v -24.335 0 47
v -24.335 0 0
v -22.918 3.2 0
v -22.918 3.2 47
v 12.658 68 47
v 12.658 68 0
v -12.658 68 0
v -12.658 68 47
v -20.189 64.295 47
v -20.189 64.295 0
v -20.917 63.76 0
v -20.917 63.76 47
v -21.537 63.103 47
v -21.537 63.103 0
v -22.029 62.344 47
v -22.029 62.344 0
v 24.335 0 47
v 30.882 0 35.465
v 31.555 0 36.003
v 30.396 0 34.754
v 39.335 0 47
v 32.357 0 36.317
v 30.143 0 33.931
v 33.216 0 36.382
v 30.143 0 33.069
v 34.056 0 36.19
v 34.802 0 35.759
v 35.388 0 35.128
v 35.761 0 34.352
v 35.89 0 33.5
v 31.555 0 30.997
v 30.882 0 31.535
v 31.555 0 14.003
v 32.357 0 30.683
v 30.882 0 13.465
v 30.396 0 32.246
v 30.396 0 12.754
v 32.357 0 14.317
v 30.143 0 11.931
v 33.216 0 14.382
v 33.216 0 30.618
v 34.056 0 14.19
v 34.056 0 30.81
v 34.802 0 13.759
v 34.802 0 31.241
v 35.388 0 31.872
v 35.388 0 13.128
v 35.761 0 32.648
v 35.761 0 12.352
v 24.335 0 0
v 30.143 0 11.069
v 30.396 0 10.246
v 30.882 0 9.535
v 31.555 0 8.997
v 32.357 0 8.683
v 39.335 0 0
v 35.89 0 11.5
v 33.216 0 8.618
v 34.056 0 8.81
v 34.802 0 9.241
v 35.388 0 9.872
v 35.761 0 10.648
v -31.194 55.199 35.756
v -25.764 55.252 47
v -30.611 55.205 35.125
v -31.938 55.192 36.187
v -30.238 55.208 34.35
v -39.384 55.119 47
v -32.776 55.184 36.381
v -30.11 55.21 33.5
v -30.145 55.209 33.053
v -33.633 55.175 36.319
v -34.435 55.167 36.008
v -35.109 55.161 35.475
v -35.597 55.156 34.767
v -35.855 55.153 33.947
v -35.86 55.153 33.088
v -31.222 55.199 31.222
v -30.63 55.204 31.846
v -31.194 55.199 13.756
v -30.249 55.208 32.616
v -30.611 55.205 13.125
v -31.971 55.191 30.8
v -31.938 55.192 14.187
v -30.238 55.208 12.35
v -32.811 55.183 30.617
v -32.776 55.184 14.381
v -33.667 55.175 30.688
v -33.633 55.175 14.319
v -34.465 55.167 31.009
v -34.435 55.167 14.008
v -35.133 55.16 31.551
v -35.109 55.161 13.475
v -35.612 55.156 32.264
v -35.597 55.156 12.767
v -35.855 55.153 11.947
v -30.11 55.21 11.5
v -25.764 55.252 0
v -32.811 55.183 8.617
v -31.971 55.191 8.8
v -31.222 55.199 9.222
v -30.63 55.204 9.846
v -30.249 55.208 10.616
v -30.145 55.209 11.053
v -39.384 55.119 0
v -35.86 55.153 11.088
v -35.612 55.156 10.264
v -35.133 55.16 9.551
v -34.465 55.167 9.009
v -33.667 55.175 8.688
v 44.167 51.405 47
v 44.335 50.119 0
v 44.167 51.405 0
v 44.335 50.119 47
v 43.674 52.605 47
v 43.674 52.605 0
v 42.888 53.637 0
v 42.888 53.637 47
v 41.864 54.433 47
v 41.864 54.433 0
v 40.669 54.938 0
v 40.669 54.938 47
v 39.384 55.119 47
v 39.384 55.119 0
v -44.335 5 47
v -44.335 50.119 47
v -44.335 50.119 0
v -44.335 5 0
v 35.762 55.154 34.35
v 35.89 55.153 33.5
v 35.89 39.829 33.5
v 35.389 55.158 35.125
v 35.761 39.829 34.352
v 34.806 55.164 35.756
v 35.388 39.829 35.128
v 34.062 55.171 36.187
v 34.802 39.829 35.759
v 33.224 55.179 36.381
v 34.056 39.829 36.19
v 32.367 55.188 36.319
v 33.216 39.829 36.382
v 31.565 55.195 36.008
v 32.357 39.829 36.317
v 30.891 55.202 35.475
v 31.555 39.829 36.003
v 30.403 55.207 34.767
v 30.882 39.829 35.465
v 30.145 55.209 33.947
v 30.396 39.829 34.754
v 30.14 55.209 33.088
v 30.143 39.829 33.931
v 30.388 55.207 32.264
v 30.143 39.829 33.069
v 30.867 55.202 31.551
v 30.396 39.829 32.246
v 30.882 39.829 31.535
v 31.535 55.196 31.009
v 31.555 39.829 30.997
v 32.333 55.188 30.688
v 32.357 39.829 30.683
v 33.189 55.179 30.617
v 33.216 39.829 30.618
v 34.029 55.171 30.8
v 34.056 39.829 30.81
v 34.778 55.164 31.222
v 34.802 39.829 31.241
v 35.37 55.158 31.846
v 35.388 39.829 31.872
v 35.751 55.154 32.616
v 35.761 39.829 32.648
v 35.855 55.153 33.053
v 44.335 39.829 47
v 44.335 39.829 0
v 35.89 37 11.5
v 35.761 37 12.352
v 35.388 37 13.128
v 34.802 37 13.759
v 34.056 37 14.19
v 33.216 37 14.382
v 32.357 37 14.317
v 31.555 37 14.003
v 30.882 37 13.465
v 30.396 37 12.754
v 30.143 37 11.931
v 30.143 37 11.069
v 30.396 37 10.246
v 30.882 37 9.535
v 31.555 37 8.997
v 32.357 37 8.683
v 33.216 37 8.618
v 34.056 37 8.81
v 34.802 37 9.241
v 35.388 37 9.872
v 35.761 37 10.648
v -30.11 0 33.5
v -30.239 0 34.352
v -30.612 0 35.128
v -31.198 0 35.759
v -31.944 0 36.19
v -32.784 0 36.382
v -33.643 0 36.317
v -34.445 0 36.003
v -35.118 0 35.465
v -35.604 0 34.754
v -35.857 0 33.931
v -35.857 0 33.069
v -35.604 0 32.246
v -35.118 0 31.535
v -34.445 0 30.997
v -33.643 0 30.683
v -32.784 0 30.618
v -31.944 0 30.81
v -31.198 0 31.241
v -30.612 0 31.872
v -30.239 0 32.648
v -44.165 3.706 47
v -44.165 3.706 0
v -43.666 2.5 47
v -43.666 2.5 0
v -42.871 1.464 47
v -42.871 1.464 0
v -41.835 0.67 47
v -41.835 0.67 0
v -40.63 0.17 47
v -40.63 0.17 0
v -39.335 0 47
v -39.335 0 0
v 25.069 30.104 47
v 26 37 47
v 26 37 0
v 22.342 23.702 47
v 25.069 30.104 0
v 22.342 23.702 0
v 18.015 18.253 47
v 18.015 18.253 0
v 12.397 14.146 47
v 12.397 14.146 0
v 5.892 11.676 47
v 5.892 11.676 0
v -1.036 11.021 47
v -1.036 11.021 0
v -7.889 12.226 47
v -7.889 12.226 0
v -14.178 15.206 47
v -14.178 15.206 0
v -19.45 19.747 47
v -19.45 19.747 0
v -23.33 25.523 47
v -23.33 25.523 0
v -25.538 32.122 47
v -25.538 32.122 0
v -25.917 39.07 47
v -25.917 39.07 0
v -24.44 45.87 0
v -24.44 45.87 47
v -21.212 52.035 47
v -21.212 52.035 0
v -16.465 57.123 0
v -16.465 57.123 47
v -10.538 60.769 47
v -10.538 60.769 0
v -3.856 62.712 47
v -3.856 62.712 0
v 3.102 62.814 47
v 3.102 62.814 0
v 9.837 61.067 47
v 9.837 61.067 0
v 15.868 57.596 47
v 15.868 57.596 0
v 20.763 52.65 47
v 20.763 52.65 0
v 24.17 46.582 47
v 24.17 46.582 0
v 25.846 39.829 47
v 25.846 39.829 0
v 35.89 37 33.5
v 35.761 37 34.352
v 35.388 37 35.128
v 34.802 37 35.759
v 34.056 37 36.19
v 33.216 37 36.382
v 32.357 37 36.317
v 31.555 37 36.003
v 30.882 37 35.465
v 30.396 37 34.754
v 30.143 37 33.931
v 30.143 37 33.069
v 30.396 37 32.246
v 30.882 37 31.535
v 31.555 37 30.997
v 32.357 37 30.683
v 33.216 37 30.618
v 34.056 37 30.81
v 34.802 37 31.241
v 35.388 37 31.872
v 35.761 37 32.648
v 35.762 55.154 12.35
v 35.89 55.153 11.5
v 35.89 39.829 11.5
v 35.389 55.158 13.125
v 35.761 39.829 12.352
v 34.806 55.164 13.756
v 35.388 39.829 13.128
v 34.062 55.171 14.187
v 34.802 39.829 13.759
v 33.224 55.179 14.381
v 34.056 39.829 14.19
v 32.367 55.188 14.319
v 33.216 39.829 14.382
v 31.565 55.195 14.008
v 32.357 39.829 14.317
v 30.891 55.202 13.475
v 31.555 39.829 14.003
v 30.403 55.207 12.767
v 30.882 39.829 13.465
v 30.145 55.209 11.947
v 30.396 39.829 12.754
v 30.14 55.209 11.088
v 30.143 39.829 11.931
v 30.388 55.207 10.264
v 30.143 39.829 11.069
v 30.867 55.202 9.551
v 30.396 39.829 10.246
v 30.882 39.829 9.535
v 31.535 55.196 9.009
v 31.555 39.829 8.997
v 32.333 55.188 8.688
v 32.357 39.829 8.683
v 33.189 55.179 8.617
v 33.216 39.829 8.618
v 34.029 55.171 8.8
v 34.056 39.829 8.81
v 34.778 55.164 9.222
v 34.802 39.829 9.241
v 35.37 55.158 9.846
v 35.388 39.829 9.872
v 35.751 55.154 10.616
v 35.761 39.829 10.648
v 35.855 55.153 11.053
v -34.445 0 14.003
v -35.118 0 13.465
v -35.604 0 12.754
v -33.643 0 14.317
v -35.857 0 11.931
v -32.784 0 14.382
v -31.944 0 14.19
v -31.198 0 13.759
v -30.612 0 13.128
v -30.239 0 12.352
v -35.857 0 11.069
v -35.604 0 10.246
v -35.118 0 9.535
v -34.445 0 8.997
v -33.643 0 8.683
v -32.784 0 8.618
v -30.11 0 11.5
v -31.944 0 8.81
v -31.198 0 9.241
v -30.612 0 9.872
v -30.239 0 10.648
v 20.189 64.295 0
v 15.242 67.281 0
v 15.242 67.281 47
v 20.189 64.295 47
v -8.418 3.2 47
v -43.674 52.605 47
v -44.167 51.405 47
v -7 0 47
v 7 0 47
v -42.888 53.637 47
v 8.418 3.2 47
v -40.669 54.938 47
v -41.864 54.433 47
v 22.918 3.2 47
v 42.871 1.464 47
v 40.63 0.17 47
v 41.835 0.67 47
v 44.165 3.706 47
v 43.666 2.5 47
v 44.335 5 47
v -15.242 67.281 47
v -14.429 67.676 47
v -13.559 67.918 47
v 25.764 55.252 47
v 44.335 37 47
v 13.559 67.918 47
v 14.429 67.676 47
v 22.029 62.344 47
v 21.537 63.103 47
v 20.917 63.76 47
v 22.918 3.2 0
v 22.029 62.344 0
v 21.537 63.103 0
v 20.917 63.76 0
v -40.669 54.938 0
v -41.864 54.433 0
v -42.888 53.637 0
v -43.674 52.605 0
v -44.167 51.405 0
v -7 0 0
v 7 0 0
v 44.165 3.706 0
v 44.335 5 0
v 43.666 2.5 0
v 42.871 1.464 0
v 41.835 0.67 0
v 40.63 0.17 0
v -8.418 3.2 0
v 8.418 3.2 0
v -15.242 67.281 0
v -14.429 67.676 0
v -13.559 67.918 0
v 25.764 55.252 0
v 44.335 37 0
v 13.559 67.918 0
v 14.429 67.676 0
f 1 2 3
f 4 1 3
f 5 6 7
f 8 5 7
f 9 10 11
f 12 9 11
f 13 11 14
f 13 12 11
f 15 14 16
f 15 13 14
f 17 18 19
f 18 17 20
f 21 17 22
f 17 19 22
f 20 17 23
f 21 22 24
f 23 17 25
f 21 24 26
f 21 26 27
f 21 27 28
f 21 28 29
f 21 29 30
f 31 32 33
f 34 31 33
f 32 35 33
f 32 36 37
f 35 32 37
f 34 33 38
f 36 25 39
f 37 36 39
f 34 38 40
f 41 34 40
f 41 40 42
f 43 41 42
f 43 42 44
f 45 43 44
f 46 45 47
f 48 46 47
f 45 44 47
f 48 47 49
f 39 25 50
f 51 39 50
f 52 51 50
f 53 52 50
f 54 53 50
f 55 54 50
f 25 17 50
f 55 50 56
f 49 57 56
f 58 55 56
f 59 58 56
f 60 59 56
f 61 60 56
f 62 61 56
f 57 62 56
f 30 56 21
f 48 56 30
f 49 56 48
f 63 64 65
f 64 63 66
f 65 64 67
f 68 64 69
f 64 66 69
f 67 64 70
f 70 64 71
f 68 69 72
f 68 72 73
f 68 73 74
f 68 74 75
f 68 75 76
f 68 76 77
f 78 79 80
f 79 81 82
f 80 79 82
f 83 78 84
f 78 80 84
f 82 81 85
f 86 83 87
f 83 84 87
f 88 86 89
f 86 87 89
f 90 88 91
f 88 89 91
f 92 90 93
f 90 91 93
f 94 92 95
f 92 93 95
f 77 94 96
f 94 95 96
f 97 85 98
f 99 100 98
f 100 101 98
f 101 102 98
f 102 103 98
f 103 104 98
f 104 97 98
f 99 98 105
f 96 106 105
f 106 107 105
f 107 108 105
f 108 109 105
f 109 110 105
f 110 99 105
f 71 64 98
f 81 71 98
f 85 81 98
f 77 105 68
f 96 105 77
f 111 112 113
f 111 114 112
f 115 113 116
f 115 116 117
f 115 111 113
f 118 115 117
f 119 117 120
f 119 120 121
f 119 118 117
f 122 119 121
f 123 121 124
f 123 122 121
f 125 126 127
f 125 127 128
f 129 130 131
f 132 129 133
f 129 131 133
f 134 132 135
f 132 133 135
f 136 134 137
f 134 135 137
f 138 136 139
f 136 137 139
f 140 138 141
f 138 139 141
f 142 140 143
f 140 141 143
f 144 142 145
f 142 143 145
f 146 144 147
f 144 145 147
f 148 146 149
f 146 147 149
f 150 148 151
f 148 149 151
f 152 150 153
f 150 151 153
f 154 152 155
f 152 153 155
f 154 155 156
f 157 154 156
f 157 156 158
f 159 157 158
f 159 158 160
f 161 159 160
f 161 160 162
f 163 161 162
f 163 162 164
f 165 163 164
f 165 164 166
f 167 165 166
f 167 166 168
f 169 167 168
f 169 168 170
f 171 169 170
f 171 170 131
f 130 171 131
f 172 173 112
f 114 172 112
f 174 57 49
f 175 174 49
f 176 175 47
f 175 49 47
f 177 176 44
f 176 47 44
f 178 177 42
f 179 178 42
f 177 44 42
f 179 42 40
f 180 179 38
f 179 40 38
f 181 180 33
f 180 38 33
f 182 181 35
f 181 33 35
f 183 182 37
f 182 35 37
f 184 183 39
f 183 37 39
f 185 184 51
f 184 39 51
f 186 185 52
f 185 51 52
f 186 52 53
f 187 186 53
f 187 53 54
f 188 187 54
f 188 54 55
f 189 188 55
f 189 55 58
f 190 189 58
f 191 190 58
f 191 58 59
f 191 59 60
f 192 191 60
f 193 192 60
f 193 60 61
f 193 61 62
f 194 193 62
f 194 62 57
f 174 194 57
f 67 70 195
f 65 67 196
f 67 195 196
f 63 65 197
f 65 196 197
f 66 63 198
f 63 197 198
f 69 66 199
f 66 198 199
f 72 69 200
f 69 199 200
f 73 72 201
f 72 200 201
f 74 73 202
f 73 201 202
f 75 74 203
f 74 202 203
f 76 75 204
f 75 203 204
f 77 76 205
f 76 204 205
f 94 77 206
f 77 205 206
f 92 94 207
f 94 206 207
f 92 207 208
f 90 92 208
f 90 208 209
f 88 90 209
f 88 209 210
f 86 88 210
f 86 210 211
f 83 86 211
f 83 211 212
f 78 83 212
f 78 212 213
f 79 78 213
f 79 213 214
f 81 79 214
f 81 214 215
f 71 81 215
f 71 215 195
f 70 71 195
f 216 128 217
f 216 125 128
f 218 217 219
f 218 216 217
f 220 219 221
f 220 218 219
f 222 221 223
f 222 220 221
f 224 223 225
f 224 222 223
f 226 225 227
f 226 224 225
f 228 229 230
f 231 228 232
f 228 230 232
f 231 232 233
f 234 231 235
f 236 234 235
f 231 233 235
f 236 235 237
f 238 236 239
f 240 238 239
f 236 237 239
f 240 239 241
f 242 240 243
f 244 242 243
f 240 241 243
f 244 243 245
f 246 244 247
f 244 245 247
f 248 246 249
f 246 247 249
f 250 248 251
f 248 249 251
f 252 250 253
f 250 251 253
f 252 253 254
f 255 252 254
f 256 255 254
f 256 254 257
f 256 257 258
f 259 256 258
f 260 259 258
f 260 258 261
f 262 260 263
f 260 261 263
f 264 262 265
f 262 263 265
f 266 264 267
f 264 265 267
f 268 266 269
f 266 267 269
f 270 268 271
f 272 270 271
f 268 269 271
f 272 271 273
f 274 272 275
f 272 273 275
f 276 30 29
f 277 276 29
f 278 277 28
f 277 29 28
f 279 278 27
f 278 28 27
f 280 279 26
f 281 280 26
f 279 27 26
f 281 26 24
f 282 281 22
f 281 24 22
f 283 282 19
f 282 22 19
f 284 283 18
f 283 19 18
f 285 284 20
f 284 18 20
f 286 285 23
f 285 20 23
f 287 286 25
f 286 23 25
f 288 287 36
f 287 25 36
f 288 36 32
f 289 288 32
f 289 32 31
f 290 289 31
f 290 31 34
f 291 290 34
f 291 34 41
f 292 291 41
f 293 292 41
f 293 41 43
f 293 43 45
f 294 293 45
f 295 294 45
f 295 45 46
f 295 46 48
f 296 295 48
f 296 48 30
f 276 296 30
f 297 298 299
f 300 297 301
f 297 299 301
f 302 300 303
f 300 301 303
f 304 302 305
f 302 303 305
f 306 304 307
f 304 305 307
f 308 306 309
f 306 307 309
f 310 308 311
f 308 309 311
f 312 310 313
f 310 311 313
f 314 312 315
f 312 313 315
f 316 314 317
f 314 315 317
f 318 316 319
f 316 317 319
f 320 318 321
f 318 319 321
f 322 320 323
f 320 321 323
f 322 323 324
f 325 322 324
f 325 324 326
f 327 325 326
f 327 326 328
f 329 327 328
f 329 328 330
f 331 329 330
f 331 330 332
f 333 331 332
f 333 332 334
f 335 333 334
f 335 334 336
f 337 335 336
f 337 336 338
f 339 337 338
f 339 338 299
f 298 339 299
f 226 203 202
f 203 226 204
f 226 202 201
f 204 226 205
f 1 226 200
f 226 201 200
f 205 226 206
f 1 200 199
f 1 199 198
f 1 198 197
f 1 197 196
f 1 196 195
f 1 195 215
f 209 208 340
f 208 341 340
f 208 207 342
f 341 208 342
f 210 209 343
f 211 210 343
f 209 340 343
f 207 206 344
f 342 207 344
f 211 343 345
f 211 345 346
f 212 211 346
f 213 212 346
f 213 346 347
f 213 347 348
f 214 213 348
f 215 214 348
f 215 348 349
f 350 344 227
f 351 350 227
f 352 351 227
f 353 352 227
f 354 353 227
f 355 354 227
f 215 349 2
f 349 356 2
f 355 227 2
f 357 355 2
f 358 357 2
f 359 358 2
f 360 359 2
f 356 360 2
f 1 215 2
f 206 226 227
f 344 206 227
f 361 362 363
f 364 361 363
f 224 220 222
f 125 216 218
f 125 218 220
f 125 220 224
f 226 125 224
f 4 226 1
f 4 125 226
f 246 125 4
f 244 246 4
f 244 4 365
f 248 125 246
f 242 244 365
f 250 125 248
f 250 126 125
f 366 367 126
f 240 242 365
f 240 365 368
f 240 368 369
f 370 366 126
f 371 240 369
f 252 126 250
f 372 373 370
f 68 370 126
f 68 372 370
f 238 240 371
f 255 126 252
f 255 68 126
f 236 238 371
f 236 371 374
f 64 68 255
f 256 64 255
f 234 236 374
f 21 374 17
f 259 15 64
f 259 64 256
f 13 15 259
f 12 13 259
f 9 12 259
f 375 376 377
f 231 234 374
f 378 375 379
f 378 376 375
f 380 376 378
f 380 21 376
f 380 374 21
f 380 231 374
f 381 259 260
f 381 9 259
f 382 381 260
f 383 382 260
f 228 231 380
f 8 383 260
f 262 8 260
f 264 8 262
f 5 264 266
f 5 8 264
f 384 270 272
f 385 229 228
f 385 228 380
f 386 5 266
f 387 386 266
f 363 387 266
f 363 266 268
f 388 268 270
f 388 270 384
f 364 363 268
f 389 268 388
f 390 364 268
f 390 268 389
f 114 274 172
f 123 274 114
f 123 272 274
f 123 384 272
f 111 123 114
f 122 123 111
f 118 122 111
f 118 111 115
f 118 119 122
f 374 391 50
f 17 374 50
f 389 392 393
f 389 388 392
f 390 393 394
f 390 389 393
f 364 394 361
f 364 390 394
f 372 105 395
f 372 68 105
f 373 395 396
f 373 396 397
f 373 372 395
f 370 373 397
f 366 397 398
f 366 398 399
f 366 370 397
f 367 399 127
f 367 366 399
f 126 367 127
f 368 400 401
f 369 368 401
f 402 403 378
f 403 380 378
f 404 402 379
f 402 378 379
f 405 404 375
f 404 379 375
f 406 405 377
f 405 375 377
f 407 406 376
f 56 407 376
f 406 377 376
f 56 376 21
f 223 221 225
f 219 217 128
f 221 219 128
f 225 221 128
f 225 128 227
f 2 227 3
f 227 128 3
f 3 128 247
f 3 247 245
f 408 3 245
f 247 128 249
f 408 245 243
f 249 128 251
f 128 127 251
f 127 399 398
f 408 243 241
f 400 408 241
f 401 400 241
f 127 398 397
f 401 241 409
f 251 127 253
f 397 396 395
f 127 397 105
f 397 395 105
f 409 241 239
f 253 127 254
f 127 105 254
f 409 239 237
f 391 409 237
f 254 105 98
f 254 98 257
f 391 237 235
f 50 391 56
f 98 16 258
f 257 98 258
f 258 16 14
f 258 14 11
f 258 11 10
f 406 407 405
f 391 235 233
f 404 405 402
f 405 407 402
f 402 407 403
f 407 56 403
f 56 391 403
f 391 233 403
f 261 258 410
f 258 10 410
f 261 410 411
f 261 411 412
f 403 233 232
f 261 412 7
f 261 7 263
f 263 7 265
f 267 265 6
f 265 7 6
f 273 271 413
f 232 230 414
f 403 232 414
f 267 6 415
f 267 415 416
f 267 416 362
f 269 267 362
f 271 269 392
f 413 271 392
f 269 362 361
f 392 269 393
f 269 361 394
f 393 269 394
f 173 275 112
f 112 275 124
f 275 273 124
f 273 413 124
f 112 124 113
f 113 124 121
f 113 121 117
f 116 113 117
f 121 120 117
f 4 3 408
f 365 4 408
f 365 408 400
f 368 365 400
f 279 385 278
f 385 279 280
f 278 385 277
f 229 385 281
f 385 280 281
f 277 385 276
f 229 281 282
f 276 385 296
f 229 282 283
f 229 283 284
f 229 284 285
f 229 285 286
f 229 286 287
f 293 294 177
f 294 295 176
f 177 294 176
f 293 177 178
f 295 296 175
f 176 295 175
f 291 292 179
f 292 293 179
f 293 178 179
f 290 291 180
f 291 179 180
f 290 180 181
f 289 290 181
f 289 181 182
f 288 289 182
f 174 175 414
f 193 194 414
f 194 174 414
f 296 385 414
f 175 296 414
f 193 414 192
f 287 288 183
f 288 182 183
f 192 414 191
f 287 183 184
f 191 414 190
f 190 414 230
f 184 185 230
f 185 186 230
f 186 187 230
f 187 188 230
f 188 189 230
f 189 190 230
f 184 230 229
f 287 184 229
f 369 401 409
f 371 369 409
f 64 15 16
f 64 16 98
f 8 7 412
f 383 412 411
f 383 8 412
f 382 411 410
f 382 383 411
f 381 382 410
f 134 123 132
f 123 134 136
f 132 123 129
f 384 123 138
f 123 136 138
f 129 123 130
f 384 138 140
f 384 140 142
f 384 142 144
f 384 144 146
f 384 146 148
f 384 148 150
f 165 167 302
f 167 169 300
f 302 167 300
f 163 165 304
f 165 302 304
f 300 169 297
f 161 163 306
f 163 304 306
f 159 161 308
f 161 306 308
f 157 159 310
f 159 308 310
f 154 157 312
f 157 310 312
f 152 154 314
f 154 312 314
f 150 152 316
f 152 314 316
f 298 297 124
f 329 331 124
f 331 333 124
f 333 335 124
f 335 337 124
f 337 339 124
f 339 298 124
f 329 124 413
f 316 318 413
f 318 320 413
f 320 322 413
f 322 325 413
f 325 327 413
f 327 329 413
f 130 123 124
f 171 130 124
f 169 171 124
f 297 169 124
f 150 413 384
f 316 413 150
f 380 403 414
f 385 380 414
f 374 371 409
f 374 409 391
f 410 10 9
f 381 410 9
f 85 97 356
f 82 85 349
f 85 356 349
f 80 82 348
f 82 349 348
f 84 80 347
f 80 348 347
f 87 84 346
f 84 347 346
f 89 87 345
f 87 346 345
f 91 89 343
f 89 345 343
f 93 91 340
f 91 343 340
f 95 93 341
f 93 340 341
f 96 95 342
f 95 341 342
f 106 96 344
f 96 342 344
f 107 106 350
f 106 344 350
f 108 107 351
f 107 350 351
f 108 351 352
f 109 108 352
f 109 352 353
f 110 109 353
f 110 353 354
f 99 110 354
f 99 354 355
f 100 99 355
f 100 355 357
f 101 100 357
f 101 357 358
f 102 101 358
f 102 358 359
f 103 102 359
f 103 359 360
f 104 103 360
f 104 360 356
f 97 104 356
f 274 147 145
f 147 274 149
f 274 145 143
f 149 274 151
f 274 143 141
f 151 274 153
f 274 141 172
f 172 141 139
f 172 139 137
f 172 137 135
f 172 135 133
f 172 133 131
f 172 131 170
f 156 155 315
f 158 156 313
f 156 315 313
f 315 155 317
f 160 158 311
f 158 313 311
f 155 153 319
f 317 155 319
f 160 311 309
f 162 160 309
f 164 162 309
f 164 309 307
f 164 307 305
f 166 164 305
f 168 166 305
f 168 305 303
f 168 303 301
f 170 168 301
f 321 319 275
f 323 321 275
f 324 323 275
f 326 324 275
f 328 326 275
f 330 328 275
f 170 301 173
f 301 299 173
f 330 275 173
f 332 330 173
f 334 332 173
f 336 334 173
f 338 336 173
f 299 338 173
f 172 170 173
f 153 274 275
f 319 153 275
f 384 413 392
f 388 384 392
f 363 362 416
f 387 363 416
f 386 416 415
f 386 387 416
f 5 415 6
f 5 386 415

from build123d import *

# Parameters (mm, degrees)
F2_DEPTH = 47
F0_R     = 2.88967587
F3_DEPTH = 69
F4_R     = 5
F5_SIZE  = 5
F6_R     = 5


with BuildPart() as f2:
    # F1 (on Top) → F2 (new body)
    with BuildSketch(Plane.XY):
        with BuildLine():
            Line((-7, 0), (0, 0))
            Line((0, 0), (7, 0))
            Line((7, 0), (8.4177446879, 3.2))
            Line((8.4177446879, 3.2), (22.9177446879, 3.2))
            Line((22.9177446879, 3.2), (24.3354893758, 0))
            Line((24.3354893758, 0), (44.3354893758, 0))
            Line((44.3354893758, 0), (44.3354893758, 37))
            Line((44.3354893758, 37), (26, 37))
            ThreePointArc((26, 37), (-25.9613897172, 35.5835805883), (25.8456735423, 39.8286320269))
            Line((25.8456735423, 39.8286320269), (44.3354893758, 39.8286320269))
            Line((44.3354893758, 39.8286320269), (44.3354893758, 55.0705678761))
            Line((44.3354893758, 55.0705678761), (25.764113456, 55.2520155907))
            Line((25.764113456, 55.2520155907), (19.0504045933, 68))
            Line((19.0504045933, 68), (-19.0504045933, 68))
            Line((-19.0504045933, 68), (-25.764113456, 55.2520155907))
            Line((-25.764113456, 55.2520155907), (-44.3354893758, 55.0705678761))
            Line((-44.3354893758, 55.0705678761), (-44.3354893758, 0))
            Line((-44.3354893758, 0), (-24.3354893758, 0))
            Line((-24.3354893758, 0), (-22.9177446879, 3.2))
            Line((-22.9177446879, 3.2), (-8.4177446879, 3.2))
            Line((-8.4177446879, 3.2), (-7, 0))
        make_face()
    extrude(amount=F2_DEPTH)

    # F0 (on Front) → F3 (cut)
    with BuildSketch(Plane.XZ):
        with Locations((-33, 33.5)):
            Circle(F0_R)
        with Locations((-33, 11.5)):
            Circle(F0_R)
        with Locations((33, 33.5)):
            Circle(F0_R)
        with Locations((33, 11.5)):
            Circle(F0_R)
    extrude(amount=-F3_DEPTH, mode=Mode.SUBTRACT)

    # F4
    f4_edges = [f2.edges().sort_by_distance(p)[0] for p in [
        (-44.335489, 55.070568, 23.5),
        (44.335489, 55.070568, 23.5),
    ]]
    fillet(f4_edges, radius=F4_R)

    # F5
    f5_edges = [f2.edges().sort_by_distance(p)[0] for p in [
        (19.050405, 68, 23.5),
        (-19.050405, 68, 23.5),
    ]]
    chamfer(f5_edges, length=F5_SIZE)

    # F6
    f6_edges = [f2.edges().sort_by_distance(p)[0] for p in [
        (21.38029, 63.576016, 23.5),
        (14.050405, 68, 23.5),
        (-14.050405, 68, 23.5),
        (-21.38029, 63.576016, 23.5),
        (44.335489, 0, 23.5),
        (-44.335489, 0, 23.5),
    ]]
    fillet(f6_edges, radius=F6_R)


solid = f2.part
